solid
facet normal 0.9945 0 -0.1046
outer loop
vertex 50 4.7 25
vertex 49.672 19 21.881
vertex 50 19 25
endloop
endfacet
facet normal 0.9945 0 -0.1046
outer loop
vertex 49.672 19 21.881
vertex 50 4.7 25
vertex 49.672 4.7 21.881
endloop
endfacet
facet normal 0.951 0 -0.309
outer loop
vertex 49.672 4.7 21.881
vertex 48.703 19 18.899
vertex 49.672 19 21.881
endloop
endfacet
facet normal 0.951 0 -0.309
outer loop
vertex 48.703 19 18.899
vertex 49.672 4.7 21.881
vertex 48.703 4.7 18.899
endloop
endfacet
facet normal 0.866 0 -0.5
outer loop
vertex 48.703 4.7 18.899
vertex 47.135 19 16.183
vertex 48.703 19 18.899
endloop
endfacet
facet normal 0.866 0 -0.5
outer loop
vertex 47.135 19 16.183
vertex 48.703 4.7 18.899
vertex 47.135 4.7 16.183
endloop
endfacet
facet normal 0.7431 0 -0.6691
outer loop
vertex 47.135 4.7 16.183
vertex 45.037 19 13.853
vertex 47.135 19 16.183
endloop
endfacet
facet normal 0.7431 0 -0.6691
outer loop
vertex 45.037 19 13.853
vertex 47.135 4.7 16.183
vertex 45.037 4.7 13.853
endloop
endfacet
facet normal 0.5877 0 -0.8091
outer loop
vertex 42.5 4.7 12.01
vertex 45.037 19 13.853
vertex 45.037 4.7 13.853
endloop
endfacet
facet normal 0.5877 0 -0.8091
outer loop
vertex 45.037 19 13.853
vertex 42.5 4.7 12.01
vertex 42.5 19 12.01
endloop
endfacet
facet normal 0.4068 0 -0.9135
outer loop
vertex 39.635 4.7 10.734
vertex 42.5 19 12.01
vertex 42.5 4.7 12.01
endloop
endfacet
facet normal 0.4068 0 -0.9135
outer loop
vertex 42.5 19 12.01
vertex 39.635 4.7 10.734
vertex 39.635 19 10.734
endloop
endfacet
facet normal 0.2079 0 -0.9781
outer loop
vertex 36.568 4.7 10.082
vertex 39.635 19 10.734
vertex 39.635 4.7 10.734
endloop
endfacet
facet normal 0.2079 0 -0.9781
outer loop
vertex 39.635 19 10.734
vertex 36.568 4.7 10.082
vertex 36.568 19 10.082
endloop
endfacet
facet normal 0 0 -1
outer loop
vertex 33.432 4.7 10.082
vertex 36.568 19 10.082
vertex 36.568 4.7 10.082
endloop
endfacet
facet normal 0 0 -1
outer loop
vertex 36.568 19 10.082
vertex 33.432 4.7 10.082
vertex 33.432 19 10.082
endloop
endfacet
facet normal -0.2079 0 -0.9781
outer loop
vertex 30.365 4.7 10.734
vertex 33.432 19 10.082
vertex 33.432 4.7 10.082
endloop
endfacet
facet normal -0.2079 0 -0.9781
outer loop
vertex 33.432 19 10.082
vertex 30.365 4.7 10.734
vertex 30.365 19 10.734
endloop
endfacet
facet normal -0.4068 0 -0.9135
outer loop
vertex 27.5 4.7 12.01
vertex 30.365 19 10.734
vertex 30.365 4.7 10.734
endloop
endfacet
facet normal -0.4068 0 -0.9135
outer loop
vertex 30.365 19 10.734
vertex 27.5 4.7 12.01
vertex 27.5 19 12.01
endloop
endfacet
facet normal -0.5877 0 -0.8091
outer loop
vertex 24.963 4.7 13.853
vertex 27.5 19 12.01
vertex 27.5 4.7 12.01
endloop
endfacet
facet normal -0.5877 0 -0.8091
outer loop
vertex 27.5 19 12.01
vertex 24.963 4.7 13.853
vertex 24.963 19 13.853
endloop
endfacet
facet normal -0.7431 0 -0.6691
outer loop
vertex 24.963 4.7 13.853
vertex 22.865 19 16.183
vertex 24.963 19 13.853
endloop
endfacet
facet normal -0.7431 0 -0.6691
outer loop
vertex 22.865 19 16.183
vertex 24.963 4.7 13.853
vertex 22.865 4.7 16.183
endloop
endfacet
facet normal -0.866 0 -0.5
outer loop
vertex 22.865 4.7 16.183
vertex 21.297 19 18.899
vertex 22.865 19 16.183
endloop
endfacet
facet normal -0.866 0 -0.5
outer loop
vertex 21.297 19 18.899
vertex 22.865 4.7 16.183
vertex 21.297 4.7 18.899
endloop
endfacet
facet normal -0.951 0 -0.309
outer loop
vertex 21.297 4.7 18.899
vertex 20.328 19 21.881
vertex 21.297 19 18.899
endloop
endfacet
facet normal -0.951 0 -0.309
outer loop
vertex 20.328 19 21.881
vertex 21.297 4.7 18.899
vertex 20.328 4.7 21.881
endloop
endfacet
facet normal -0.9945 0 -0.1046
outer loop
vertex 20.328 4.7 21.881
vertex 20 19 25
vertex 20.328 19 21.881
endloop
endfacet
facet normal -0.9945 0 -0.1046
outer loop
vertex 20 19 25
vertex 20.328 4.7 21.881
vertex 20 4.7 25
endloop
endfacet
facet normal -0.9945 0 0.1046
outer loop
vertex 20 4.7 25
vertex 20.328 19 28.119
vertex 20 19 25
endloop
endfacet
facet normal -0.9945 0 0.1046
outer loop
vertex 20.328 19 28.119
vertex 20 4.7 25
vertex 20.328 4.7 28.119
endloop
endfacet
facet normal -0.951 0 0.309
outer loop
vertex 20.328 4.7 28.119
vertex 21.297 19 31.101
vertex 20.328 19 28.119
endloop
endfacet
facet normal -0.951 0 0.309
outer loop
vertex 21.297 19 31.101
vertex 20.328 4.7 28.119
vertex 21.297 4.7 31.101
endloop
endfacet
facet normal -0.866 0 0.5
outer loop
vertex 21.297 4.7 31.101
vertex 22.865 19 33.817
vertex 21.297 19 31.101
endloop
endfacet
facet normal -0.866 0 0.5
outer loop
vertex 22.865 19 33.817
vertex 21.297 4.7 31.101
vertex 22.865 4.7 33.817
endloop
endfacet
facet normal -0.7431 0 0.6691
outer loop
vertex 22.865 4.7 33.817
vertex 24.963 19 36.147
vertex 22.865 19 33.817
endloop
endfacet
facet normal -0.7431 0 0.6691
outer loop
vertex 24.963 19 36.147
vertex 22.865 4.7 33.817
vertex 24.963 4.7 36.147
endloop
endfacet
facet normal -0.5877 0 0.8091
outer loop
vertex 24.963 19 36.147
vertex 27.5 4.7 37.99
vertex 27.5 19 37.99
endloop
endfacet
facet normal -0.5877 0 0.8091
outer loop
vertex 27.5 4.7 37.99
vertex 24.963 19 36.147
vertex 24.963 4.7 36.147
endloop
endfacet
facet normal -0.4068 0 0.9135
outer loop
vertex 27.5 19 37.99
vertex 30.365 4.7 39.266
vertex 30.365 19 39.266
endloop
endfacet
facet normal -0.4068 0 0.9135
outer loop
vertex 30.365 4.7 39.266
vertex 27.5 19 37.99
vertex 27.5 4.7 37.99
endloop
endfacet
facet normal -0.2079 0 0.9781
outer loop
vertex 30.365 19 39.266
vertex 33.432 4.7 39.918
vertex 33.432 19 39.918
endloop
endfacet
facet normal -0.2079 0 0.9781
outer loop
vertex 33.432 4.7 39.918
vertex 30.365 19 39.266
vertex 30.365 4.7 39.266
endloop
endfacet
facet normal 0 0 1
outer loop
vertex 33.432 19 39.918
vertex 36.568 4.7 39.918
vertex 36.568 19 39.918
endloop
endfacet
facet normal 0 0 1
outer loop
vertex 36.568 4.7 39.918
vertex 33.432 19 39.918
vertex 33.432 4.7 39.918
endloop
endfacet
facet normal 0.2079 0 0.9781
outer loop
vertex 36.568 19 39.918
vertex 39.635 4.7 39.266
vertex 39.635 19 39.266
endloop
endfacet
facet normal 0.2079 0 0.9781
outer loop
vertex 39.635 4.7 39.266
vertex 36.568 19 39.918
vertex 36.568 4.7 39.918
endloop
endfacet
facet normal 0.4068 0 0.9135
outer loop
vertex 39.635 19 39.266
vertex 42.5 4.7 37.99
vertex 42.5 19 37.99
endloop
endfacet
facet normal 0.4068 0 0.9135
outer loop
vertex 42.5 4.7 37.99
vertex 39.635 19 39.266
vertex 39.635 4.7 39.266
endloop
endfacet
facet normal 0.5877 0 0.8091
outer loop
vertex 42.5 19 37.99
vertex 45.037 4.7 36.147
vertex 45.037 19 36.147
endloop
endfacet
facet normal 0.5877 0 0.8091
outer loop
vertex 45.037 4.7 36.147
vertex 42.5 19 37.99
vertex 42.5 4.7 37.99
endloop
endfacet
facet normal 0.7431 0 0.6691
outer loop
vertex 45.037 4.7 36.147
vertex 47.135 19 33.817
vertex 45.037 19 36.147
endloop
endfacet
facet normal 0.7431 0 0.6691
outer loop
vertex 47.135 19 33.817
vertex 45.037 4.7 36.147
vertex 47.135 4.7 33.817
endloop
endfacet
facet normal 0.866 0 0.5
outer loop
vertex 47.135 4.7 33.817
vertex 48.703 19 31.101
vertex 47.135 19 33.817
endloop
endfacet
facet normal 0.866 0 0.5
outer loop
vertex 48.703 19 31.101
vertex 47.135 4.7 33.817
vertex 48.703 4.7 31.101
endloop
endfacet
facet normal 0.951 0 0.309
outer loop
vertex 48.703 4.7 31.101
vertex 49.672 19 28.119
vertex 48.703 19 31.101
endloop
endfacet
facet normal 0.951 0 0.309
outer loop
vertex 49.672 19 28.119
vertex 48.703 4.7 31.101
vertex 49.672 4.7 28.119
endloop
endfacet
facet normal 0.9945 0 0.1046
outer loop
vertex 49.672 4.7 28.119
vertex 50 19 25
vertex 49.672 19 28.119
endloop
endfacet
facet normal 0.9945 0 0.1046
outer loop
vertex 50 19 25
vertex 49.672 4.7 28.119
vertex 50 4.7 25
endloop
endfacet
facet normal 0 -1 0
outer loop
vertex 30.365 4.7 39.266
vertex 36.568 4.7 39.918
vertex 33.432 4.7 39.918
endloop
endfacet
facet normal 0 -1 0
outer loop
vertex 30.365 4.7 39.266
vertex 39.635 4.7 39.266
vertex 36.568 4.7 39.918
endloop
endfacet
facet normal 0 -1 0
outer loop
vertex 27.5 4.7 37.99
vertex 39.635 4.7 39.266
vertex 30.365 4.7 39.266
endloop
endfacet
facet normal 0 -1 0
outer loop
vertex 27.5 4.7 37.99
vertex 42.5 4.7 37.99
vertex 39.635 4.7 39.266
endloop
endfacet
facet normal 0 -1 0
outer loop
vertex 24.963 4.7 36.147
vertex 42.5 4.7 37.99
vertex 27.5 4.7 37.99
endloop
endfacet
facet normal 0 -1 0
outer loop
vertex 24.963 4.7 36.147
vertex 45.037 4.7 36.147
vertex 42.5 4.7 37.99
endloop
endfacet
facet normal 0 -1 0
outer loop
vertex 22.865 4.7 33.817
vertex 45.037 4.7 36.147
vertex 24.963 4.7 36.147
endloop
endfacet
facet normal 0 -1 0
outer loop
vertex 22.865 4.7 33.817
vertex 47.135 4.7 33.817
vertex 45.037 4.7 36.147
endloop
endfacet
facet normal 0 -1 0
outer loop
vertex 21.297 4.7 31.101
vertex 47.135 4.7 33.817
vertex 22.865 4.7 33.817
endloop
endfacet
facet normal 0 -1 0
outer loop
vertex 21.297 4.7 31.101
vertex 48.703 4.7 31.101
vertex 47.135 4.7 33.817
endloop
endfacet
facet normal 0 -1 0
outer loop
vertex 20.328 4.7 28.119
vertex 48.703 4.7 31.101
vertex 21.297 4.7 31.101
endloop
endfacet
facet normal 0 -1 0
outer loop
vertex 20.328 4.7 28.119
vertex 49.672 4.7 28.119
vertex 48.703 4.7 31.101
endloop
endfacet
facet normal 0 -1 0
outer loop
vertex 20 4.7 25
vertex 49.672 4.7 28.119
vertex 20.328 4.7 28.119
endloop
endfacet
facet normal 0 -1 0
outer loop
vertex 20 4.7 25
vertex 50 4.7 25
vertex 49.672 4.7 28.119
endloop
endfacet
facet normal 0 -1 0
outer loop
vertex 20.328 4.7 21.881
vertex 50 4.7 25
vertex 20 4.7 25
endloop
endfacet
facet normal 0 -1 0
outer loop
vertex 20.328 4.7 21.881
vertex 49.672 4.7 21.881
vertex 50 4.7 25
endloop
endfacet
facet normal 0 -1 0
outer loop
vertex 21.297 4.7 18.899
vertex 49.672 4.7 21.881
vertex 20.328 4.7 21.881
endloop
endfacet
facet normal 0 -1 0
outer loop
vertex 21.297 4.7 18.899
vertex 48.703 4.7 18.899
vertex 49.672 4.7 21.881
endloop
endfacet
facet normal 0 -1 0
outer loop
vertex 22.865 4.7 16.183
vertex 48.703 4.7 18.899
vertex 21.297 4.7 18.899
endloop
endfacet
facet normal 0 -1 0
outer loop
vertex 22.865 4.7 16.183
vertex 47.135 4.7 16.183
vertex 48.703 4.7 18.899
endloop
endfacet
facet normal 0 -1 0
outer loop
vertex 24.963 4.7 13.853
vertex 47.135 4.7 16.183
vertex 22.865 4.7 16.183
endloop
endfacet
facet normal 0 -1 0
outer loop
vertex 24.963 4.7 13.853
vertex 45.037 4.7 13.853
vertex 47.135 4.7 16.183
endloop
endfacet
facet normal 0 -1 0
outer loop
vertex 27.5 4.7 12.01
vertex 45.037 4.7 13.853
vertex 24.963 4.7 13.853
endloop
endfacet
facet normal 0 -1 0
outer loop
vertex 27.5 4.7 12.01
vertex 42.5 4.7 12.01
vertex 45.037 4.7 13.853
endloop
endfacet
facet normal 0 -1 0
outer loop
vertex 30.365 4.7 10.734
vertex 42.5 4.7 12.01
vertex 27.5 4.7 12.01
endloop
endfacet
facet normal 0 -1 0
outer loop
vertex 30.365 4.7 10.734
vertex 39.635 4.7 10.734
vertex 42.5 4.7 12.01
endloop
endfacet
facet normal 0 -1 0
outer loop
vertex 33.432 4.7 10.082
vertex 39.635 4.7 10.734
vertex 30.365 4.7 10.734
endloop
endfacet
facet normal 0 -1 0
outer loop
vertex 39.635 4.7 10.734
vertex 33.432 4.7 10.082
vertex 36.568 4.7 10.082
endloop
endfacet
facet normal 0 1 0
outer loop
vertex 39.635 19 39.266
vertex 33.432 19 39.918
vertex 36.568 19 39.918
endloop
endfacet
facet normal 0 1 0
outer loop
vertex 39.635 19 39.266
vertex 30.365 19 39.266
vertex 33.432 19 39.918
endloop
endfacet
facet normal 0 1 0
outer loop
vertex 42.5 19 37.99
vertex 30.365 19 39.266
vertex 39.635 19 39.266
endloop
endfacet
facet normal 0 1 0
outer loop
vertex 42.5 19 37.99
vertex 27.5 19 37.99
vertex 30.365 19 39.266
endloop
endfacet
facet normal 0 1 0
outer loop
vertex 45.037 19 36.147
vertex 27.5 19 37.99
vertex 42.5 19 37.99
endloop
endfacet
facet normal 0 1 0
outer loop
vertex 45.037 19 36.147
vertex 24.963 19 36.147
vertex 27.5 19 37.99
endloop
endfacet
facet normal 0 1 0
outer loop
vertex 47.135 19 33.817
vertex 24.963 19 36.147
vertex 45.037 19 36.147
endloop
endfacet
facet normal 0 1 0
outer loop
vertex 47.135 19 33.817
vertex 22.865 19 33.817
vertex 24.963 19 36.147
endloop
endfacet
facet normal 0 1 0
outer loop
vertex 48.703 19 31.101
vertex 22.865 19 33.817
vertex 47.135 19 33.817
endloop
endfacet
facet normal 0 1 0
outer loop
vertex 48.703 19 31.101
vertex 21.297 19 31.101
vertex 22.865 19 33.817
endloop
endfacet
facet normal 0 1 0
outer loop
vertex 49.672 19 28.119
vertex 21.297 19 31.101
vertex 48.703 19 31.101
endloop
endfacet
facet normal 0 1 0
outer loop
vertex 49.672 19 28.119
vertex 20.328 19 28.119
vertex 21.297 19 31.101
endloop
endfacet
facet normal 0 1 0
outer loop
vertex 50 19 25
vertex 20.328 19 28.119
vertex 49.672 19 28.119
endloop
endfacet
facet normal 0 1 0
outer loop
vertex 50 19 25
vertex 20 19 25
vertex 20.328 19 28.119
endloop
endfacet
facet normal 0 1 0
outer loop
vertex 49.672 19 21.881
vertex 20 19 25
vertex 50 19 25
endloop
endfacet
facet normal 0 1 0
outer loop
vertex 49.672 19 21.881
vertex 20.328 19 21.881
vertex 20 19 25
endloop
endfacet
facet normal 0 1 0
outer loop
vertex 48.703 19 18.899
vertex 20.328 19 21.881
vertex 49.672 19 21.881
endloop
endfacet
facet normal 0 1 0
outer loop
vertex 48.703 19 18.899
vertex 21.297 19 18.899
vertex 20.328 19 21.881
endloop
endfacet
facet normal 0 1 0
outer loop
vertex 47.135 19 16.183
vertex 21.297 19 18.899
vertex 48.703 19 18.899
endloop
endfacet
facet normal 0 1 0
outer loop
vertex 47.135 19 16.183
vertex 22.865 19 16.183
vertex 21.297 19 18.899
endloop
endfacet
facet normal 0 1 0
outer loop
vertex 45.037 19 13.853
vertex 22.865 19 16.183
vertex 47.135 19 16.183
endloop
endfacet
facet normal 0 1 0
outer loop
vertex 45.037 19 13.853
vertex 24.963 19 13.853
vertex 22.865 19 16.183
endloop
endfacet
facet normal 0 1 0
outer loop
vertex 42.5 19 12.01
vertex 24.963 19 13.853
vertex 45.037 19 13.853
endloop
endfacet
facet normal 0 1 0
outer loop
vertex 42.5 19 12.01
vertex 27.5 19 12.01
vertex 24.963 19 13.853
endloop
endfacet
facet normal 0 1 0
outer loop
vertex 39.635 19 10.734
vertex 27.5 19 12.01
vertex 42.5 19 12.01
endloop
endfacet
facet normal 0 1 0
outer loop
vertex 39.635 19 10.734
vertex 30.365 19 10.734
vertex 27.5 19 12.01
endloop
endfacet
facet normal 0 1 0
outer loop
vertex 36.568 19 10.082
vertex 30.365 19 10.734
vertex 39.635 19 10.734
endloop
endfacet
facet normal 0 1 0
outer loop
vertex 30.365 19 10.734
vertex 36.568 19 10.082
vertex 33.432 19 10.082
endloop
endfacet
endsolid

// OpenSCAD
include <MCAD/nuts_and_bolts.scad>

L=24;
B=70;
H1=24;
P=52;
B1=36;
h1=25;
bore=9;

bd=30;
bl=14.3;
sd=10;

difference () {
%union() {
cube([B,L,H1]);
translate([(B-B1)/2,0,h1-B1/2]) cube([B1,L,B1]);
}
    translate([B/2,L/2-bl+7,h1]) rotate([-90,0,0]) cylinder(h=bl, r=bd/2);
}
